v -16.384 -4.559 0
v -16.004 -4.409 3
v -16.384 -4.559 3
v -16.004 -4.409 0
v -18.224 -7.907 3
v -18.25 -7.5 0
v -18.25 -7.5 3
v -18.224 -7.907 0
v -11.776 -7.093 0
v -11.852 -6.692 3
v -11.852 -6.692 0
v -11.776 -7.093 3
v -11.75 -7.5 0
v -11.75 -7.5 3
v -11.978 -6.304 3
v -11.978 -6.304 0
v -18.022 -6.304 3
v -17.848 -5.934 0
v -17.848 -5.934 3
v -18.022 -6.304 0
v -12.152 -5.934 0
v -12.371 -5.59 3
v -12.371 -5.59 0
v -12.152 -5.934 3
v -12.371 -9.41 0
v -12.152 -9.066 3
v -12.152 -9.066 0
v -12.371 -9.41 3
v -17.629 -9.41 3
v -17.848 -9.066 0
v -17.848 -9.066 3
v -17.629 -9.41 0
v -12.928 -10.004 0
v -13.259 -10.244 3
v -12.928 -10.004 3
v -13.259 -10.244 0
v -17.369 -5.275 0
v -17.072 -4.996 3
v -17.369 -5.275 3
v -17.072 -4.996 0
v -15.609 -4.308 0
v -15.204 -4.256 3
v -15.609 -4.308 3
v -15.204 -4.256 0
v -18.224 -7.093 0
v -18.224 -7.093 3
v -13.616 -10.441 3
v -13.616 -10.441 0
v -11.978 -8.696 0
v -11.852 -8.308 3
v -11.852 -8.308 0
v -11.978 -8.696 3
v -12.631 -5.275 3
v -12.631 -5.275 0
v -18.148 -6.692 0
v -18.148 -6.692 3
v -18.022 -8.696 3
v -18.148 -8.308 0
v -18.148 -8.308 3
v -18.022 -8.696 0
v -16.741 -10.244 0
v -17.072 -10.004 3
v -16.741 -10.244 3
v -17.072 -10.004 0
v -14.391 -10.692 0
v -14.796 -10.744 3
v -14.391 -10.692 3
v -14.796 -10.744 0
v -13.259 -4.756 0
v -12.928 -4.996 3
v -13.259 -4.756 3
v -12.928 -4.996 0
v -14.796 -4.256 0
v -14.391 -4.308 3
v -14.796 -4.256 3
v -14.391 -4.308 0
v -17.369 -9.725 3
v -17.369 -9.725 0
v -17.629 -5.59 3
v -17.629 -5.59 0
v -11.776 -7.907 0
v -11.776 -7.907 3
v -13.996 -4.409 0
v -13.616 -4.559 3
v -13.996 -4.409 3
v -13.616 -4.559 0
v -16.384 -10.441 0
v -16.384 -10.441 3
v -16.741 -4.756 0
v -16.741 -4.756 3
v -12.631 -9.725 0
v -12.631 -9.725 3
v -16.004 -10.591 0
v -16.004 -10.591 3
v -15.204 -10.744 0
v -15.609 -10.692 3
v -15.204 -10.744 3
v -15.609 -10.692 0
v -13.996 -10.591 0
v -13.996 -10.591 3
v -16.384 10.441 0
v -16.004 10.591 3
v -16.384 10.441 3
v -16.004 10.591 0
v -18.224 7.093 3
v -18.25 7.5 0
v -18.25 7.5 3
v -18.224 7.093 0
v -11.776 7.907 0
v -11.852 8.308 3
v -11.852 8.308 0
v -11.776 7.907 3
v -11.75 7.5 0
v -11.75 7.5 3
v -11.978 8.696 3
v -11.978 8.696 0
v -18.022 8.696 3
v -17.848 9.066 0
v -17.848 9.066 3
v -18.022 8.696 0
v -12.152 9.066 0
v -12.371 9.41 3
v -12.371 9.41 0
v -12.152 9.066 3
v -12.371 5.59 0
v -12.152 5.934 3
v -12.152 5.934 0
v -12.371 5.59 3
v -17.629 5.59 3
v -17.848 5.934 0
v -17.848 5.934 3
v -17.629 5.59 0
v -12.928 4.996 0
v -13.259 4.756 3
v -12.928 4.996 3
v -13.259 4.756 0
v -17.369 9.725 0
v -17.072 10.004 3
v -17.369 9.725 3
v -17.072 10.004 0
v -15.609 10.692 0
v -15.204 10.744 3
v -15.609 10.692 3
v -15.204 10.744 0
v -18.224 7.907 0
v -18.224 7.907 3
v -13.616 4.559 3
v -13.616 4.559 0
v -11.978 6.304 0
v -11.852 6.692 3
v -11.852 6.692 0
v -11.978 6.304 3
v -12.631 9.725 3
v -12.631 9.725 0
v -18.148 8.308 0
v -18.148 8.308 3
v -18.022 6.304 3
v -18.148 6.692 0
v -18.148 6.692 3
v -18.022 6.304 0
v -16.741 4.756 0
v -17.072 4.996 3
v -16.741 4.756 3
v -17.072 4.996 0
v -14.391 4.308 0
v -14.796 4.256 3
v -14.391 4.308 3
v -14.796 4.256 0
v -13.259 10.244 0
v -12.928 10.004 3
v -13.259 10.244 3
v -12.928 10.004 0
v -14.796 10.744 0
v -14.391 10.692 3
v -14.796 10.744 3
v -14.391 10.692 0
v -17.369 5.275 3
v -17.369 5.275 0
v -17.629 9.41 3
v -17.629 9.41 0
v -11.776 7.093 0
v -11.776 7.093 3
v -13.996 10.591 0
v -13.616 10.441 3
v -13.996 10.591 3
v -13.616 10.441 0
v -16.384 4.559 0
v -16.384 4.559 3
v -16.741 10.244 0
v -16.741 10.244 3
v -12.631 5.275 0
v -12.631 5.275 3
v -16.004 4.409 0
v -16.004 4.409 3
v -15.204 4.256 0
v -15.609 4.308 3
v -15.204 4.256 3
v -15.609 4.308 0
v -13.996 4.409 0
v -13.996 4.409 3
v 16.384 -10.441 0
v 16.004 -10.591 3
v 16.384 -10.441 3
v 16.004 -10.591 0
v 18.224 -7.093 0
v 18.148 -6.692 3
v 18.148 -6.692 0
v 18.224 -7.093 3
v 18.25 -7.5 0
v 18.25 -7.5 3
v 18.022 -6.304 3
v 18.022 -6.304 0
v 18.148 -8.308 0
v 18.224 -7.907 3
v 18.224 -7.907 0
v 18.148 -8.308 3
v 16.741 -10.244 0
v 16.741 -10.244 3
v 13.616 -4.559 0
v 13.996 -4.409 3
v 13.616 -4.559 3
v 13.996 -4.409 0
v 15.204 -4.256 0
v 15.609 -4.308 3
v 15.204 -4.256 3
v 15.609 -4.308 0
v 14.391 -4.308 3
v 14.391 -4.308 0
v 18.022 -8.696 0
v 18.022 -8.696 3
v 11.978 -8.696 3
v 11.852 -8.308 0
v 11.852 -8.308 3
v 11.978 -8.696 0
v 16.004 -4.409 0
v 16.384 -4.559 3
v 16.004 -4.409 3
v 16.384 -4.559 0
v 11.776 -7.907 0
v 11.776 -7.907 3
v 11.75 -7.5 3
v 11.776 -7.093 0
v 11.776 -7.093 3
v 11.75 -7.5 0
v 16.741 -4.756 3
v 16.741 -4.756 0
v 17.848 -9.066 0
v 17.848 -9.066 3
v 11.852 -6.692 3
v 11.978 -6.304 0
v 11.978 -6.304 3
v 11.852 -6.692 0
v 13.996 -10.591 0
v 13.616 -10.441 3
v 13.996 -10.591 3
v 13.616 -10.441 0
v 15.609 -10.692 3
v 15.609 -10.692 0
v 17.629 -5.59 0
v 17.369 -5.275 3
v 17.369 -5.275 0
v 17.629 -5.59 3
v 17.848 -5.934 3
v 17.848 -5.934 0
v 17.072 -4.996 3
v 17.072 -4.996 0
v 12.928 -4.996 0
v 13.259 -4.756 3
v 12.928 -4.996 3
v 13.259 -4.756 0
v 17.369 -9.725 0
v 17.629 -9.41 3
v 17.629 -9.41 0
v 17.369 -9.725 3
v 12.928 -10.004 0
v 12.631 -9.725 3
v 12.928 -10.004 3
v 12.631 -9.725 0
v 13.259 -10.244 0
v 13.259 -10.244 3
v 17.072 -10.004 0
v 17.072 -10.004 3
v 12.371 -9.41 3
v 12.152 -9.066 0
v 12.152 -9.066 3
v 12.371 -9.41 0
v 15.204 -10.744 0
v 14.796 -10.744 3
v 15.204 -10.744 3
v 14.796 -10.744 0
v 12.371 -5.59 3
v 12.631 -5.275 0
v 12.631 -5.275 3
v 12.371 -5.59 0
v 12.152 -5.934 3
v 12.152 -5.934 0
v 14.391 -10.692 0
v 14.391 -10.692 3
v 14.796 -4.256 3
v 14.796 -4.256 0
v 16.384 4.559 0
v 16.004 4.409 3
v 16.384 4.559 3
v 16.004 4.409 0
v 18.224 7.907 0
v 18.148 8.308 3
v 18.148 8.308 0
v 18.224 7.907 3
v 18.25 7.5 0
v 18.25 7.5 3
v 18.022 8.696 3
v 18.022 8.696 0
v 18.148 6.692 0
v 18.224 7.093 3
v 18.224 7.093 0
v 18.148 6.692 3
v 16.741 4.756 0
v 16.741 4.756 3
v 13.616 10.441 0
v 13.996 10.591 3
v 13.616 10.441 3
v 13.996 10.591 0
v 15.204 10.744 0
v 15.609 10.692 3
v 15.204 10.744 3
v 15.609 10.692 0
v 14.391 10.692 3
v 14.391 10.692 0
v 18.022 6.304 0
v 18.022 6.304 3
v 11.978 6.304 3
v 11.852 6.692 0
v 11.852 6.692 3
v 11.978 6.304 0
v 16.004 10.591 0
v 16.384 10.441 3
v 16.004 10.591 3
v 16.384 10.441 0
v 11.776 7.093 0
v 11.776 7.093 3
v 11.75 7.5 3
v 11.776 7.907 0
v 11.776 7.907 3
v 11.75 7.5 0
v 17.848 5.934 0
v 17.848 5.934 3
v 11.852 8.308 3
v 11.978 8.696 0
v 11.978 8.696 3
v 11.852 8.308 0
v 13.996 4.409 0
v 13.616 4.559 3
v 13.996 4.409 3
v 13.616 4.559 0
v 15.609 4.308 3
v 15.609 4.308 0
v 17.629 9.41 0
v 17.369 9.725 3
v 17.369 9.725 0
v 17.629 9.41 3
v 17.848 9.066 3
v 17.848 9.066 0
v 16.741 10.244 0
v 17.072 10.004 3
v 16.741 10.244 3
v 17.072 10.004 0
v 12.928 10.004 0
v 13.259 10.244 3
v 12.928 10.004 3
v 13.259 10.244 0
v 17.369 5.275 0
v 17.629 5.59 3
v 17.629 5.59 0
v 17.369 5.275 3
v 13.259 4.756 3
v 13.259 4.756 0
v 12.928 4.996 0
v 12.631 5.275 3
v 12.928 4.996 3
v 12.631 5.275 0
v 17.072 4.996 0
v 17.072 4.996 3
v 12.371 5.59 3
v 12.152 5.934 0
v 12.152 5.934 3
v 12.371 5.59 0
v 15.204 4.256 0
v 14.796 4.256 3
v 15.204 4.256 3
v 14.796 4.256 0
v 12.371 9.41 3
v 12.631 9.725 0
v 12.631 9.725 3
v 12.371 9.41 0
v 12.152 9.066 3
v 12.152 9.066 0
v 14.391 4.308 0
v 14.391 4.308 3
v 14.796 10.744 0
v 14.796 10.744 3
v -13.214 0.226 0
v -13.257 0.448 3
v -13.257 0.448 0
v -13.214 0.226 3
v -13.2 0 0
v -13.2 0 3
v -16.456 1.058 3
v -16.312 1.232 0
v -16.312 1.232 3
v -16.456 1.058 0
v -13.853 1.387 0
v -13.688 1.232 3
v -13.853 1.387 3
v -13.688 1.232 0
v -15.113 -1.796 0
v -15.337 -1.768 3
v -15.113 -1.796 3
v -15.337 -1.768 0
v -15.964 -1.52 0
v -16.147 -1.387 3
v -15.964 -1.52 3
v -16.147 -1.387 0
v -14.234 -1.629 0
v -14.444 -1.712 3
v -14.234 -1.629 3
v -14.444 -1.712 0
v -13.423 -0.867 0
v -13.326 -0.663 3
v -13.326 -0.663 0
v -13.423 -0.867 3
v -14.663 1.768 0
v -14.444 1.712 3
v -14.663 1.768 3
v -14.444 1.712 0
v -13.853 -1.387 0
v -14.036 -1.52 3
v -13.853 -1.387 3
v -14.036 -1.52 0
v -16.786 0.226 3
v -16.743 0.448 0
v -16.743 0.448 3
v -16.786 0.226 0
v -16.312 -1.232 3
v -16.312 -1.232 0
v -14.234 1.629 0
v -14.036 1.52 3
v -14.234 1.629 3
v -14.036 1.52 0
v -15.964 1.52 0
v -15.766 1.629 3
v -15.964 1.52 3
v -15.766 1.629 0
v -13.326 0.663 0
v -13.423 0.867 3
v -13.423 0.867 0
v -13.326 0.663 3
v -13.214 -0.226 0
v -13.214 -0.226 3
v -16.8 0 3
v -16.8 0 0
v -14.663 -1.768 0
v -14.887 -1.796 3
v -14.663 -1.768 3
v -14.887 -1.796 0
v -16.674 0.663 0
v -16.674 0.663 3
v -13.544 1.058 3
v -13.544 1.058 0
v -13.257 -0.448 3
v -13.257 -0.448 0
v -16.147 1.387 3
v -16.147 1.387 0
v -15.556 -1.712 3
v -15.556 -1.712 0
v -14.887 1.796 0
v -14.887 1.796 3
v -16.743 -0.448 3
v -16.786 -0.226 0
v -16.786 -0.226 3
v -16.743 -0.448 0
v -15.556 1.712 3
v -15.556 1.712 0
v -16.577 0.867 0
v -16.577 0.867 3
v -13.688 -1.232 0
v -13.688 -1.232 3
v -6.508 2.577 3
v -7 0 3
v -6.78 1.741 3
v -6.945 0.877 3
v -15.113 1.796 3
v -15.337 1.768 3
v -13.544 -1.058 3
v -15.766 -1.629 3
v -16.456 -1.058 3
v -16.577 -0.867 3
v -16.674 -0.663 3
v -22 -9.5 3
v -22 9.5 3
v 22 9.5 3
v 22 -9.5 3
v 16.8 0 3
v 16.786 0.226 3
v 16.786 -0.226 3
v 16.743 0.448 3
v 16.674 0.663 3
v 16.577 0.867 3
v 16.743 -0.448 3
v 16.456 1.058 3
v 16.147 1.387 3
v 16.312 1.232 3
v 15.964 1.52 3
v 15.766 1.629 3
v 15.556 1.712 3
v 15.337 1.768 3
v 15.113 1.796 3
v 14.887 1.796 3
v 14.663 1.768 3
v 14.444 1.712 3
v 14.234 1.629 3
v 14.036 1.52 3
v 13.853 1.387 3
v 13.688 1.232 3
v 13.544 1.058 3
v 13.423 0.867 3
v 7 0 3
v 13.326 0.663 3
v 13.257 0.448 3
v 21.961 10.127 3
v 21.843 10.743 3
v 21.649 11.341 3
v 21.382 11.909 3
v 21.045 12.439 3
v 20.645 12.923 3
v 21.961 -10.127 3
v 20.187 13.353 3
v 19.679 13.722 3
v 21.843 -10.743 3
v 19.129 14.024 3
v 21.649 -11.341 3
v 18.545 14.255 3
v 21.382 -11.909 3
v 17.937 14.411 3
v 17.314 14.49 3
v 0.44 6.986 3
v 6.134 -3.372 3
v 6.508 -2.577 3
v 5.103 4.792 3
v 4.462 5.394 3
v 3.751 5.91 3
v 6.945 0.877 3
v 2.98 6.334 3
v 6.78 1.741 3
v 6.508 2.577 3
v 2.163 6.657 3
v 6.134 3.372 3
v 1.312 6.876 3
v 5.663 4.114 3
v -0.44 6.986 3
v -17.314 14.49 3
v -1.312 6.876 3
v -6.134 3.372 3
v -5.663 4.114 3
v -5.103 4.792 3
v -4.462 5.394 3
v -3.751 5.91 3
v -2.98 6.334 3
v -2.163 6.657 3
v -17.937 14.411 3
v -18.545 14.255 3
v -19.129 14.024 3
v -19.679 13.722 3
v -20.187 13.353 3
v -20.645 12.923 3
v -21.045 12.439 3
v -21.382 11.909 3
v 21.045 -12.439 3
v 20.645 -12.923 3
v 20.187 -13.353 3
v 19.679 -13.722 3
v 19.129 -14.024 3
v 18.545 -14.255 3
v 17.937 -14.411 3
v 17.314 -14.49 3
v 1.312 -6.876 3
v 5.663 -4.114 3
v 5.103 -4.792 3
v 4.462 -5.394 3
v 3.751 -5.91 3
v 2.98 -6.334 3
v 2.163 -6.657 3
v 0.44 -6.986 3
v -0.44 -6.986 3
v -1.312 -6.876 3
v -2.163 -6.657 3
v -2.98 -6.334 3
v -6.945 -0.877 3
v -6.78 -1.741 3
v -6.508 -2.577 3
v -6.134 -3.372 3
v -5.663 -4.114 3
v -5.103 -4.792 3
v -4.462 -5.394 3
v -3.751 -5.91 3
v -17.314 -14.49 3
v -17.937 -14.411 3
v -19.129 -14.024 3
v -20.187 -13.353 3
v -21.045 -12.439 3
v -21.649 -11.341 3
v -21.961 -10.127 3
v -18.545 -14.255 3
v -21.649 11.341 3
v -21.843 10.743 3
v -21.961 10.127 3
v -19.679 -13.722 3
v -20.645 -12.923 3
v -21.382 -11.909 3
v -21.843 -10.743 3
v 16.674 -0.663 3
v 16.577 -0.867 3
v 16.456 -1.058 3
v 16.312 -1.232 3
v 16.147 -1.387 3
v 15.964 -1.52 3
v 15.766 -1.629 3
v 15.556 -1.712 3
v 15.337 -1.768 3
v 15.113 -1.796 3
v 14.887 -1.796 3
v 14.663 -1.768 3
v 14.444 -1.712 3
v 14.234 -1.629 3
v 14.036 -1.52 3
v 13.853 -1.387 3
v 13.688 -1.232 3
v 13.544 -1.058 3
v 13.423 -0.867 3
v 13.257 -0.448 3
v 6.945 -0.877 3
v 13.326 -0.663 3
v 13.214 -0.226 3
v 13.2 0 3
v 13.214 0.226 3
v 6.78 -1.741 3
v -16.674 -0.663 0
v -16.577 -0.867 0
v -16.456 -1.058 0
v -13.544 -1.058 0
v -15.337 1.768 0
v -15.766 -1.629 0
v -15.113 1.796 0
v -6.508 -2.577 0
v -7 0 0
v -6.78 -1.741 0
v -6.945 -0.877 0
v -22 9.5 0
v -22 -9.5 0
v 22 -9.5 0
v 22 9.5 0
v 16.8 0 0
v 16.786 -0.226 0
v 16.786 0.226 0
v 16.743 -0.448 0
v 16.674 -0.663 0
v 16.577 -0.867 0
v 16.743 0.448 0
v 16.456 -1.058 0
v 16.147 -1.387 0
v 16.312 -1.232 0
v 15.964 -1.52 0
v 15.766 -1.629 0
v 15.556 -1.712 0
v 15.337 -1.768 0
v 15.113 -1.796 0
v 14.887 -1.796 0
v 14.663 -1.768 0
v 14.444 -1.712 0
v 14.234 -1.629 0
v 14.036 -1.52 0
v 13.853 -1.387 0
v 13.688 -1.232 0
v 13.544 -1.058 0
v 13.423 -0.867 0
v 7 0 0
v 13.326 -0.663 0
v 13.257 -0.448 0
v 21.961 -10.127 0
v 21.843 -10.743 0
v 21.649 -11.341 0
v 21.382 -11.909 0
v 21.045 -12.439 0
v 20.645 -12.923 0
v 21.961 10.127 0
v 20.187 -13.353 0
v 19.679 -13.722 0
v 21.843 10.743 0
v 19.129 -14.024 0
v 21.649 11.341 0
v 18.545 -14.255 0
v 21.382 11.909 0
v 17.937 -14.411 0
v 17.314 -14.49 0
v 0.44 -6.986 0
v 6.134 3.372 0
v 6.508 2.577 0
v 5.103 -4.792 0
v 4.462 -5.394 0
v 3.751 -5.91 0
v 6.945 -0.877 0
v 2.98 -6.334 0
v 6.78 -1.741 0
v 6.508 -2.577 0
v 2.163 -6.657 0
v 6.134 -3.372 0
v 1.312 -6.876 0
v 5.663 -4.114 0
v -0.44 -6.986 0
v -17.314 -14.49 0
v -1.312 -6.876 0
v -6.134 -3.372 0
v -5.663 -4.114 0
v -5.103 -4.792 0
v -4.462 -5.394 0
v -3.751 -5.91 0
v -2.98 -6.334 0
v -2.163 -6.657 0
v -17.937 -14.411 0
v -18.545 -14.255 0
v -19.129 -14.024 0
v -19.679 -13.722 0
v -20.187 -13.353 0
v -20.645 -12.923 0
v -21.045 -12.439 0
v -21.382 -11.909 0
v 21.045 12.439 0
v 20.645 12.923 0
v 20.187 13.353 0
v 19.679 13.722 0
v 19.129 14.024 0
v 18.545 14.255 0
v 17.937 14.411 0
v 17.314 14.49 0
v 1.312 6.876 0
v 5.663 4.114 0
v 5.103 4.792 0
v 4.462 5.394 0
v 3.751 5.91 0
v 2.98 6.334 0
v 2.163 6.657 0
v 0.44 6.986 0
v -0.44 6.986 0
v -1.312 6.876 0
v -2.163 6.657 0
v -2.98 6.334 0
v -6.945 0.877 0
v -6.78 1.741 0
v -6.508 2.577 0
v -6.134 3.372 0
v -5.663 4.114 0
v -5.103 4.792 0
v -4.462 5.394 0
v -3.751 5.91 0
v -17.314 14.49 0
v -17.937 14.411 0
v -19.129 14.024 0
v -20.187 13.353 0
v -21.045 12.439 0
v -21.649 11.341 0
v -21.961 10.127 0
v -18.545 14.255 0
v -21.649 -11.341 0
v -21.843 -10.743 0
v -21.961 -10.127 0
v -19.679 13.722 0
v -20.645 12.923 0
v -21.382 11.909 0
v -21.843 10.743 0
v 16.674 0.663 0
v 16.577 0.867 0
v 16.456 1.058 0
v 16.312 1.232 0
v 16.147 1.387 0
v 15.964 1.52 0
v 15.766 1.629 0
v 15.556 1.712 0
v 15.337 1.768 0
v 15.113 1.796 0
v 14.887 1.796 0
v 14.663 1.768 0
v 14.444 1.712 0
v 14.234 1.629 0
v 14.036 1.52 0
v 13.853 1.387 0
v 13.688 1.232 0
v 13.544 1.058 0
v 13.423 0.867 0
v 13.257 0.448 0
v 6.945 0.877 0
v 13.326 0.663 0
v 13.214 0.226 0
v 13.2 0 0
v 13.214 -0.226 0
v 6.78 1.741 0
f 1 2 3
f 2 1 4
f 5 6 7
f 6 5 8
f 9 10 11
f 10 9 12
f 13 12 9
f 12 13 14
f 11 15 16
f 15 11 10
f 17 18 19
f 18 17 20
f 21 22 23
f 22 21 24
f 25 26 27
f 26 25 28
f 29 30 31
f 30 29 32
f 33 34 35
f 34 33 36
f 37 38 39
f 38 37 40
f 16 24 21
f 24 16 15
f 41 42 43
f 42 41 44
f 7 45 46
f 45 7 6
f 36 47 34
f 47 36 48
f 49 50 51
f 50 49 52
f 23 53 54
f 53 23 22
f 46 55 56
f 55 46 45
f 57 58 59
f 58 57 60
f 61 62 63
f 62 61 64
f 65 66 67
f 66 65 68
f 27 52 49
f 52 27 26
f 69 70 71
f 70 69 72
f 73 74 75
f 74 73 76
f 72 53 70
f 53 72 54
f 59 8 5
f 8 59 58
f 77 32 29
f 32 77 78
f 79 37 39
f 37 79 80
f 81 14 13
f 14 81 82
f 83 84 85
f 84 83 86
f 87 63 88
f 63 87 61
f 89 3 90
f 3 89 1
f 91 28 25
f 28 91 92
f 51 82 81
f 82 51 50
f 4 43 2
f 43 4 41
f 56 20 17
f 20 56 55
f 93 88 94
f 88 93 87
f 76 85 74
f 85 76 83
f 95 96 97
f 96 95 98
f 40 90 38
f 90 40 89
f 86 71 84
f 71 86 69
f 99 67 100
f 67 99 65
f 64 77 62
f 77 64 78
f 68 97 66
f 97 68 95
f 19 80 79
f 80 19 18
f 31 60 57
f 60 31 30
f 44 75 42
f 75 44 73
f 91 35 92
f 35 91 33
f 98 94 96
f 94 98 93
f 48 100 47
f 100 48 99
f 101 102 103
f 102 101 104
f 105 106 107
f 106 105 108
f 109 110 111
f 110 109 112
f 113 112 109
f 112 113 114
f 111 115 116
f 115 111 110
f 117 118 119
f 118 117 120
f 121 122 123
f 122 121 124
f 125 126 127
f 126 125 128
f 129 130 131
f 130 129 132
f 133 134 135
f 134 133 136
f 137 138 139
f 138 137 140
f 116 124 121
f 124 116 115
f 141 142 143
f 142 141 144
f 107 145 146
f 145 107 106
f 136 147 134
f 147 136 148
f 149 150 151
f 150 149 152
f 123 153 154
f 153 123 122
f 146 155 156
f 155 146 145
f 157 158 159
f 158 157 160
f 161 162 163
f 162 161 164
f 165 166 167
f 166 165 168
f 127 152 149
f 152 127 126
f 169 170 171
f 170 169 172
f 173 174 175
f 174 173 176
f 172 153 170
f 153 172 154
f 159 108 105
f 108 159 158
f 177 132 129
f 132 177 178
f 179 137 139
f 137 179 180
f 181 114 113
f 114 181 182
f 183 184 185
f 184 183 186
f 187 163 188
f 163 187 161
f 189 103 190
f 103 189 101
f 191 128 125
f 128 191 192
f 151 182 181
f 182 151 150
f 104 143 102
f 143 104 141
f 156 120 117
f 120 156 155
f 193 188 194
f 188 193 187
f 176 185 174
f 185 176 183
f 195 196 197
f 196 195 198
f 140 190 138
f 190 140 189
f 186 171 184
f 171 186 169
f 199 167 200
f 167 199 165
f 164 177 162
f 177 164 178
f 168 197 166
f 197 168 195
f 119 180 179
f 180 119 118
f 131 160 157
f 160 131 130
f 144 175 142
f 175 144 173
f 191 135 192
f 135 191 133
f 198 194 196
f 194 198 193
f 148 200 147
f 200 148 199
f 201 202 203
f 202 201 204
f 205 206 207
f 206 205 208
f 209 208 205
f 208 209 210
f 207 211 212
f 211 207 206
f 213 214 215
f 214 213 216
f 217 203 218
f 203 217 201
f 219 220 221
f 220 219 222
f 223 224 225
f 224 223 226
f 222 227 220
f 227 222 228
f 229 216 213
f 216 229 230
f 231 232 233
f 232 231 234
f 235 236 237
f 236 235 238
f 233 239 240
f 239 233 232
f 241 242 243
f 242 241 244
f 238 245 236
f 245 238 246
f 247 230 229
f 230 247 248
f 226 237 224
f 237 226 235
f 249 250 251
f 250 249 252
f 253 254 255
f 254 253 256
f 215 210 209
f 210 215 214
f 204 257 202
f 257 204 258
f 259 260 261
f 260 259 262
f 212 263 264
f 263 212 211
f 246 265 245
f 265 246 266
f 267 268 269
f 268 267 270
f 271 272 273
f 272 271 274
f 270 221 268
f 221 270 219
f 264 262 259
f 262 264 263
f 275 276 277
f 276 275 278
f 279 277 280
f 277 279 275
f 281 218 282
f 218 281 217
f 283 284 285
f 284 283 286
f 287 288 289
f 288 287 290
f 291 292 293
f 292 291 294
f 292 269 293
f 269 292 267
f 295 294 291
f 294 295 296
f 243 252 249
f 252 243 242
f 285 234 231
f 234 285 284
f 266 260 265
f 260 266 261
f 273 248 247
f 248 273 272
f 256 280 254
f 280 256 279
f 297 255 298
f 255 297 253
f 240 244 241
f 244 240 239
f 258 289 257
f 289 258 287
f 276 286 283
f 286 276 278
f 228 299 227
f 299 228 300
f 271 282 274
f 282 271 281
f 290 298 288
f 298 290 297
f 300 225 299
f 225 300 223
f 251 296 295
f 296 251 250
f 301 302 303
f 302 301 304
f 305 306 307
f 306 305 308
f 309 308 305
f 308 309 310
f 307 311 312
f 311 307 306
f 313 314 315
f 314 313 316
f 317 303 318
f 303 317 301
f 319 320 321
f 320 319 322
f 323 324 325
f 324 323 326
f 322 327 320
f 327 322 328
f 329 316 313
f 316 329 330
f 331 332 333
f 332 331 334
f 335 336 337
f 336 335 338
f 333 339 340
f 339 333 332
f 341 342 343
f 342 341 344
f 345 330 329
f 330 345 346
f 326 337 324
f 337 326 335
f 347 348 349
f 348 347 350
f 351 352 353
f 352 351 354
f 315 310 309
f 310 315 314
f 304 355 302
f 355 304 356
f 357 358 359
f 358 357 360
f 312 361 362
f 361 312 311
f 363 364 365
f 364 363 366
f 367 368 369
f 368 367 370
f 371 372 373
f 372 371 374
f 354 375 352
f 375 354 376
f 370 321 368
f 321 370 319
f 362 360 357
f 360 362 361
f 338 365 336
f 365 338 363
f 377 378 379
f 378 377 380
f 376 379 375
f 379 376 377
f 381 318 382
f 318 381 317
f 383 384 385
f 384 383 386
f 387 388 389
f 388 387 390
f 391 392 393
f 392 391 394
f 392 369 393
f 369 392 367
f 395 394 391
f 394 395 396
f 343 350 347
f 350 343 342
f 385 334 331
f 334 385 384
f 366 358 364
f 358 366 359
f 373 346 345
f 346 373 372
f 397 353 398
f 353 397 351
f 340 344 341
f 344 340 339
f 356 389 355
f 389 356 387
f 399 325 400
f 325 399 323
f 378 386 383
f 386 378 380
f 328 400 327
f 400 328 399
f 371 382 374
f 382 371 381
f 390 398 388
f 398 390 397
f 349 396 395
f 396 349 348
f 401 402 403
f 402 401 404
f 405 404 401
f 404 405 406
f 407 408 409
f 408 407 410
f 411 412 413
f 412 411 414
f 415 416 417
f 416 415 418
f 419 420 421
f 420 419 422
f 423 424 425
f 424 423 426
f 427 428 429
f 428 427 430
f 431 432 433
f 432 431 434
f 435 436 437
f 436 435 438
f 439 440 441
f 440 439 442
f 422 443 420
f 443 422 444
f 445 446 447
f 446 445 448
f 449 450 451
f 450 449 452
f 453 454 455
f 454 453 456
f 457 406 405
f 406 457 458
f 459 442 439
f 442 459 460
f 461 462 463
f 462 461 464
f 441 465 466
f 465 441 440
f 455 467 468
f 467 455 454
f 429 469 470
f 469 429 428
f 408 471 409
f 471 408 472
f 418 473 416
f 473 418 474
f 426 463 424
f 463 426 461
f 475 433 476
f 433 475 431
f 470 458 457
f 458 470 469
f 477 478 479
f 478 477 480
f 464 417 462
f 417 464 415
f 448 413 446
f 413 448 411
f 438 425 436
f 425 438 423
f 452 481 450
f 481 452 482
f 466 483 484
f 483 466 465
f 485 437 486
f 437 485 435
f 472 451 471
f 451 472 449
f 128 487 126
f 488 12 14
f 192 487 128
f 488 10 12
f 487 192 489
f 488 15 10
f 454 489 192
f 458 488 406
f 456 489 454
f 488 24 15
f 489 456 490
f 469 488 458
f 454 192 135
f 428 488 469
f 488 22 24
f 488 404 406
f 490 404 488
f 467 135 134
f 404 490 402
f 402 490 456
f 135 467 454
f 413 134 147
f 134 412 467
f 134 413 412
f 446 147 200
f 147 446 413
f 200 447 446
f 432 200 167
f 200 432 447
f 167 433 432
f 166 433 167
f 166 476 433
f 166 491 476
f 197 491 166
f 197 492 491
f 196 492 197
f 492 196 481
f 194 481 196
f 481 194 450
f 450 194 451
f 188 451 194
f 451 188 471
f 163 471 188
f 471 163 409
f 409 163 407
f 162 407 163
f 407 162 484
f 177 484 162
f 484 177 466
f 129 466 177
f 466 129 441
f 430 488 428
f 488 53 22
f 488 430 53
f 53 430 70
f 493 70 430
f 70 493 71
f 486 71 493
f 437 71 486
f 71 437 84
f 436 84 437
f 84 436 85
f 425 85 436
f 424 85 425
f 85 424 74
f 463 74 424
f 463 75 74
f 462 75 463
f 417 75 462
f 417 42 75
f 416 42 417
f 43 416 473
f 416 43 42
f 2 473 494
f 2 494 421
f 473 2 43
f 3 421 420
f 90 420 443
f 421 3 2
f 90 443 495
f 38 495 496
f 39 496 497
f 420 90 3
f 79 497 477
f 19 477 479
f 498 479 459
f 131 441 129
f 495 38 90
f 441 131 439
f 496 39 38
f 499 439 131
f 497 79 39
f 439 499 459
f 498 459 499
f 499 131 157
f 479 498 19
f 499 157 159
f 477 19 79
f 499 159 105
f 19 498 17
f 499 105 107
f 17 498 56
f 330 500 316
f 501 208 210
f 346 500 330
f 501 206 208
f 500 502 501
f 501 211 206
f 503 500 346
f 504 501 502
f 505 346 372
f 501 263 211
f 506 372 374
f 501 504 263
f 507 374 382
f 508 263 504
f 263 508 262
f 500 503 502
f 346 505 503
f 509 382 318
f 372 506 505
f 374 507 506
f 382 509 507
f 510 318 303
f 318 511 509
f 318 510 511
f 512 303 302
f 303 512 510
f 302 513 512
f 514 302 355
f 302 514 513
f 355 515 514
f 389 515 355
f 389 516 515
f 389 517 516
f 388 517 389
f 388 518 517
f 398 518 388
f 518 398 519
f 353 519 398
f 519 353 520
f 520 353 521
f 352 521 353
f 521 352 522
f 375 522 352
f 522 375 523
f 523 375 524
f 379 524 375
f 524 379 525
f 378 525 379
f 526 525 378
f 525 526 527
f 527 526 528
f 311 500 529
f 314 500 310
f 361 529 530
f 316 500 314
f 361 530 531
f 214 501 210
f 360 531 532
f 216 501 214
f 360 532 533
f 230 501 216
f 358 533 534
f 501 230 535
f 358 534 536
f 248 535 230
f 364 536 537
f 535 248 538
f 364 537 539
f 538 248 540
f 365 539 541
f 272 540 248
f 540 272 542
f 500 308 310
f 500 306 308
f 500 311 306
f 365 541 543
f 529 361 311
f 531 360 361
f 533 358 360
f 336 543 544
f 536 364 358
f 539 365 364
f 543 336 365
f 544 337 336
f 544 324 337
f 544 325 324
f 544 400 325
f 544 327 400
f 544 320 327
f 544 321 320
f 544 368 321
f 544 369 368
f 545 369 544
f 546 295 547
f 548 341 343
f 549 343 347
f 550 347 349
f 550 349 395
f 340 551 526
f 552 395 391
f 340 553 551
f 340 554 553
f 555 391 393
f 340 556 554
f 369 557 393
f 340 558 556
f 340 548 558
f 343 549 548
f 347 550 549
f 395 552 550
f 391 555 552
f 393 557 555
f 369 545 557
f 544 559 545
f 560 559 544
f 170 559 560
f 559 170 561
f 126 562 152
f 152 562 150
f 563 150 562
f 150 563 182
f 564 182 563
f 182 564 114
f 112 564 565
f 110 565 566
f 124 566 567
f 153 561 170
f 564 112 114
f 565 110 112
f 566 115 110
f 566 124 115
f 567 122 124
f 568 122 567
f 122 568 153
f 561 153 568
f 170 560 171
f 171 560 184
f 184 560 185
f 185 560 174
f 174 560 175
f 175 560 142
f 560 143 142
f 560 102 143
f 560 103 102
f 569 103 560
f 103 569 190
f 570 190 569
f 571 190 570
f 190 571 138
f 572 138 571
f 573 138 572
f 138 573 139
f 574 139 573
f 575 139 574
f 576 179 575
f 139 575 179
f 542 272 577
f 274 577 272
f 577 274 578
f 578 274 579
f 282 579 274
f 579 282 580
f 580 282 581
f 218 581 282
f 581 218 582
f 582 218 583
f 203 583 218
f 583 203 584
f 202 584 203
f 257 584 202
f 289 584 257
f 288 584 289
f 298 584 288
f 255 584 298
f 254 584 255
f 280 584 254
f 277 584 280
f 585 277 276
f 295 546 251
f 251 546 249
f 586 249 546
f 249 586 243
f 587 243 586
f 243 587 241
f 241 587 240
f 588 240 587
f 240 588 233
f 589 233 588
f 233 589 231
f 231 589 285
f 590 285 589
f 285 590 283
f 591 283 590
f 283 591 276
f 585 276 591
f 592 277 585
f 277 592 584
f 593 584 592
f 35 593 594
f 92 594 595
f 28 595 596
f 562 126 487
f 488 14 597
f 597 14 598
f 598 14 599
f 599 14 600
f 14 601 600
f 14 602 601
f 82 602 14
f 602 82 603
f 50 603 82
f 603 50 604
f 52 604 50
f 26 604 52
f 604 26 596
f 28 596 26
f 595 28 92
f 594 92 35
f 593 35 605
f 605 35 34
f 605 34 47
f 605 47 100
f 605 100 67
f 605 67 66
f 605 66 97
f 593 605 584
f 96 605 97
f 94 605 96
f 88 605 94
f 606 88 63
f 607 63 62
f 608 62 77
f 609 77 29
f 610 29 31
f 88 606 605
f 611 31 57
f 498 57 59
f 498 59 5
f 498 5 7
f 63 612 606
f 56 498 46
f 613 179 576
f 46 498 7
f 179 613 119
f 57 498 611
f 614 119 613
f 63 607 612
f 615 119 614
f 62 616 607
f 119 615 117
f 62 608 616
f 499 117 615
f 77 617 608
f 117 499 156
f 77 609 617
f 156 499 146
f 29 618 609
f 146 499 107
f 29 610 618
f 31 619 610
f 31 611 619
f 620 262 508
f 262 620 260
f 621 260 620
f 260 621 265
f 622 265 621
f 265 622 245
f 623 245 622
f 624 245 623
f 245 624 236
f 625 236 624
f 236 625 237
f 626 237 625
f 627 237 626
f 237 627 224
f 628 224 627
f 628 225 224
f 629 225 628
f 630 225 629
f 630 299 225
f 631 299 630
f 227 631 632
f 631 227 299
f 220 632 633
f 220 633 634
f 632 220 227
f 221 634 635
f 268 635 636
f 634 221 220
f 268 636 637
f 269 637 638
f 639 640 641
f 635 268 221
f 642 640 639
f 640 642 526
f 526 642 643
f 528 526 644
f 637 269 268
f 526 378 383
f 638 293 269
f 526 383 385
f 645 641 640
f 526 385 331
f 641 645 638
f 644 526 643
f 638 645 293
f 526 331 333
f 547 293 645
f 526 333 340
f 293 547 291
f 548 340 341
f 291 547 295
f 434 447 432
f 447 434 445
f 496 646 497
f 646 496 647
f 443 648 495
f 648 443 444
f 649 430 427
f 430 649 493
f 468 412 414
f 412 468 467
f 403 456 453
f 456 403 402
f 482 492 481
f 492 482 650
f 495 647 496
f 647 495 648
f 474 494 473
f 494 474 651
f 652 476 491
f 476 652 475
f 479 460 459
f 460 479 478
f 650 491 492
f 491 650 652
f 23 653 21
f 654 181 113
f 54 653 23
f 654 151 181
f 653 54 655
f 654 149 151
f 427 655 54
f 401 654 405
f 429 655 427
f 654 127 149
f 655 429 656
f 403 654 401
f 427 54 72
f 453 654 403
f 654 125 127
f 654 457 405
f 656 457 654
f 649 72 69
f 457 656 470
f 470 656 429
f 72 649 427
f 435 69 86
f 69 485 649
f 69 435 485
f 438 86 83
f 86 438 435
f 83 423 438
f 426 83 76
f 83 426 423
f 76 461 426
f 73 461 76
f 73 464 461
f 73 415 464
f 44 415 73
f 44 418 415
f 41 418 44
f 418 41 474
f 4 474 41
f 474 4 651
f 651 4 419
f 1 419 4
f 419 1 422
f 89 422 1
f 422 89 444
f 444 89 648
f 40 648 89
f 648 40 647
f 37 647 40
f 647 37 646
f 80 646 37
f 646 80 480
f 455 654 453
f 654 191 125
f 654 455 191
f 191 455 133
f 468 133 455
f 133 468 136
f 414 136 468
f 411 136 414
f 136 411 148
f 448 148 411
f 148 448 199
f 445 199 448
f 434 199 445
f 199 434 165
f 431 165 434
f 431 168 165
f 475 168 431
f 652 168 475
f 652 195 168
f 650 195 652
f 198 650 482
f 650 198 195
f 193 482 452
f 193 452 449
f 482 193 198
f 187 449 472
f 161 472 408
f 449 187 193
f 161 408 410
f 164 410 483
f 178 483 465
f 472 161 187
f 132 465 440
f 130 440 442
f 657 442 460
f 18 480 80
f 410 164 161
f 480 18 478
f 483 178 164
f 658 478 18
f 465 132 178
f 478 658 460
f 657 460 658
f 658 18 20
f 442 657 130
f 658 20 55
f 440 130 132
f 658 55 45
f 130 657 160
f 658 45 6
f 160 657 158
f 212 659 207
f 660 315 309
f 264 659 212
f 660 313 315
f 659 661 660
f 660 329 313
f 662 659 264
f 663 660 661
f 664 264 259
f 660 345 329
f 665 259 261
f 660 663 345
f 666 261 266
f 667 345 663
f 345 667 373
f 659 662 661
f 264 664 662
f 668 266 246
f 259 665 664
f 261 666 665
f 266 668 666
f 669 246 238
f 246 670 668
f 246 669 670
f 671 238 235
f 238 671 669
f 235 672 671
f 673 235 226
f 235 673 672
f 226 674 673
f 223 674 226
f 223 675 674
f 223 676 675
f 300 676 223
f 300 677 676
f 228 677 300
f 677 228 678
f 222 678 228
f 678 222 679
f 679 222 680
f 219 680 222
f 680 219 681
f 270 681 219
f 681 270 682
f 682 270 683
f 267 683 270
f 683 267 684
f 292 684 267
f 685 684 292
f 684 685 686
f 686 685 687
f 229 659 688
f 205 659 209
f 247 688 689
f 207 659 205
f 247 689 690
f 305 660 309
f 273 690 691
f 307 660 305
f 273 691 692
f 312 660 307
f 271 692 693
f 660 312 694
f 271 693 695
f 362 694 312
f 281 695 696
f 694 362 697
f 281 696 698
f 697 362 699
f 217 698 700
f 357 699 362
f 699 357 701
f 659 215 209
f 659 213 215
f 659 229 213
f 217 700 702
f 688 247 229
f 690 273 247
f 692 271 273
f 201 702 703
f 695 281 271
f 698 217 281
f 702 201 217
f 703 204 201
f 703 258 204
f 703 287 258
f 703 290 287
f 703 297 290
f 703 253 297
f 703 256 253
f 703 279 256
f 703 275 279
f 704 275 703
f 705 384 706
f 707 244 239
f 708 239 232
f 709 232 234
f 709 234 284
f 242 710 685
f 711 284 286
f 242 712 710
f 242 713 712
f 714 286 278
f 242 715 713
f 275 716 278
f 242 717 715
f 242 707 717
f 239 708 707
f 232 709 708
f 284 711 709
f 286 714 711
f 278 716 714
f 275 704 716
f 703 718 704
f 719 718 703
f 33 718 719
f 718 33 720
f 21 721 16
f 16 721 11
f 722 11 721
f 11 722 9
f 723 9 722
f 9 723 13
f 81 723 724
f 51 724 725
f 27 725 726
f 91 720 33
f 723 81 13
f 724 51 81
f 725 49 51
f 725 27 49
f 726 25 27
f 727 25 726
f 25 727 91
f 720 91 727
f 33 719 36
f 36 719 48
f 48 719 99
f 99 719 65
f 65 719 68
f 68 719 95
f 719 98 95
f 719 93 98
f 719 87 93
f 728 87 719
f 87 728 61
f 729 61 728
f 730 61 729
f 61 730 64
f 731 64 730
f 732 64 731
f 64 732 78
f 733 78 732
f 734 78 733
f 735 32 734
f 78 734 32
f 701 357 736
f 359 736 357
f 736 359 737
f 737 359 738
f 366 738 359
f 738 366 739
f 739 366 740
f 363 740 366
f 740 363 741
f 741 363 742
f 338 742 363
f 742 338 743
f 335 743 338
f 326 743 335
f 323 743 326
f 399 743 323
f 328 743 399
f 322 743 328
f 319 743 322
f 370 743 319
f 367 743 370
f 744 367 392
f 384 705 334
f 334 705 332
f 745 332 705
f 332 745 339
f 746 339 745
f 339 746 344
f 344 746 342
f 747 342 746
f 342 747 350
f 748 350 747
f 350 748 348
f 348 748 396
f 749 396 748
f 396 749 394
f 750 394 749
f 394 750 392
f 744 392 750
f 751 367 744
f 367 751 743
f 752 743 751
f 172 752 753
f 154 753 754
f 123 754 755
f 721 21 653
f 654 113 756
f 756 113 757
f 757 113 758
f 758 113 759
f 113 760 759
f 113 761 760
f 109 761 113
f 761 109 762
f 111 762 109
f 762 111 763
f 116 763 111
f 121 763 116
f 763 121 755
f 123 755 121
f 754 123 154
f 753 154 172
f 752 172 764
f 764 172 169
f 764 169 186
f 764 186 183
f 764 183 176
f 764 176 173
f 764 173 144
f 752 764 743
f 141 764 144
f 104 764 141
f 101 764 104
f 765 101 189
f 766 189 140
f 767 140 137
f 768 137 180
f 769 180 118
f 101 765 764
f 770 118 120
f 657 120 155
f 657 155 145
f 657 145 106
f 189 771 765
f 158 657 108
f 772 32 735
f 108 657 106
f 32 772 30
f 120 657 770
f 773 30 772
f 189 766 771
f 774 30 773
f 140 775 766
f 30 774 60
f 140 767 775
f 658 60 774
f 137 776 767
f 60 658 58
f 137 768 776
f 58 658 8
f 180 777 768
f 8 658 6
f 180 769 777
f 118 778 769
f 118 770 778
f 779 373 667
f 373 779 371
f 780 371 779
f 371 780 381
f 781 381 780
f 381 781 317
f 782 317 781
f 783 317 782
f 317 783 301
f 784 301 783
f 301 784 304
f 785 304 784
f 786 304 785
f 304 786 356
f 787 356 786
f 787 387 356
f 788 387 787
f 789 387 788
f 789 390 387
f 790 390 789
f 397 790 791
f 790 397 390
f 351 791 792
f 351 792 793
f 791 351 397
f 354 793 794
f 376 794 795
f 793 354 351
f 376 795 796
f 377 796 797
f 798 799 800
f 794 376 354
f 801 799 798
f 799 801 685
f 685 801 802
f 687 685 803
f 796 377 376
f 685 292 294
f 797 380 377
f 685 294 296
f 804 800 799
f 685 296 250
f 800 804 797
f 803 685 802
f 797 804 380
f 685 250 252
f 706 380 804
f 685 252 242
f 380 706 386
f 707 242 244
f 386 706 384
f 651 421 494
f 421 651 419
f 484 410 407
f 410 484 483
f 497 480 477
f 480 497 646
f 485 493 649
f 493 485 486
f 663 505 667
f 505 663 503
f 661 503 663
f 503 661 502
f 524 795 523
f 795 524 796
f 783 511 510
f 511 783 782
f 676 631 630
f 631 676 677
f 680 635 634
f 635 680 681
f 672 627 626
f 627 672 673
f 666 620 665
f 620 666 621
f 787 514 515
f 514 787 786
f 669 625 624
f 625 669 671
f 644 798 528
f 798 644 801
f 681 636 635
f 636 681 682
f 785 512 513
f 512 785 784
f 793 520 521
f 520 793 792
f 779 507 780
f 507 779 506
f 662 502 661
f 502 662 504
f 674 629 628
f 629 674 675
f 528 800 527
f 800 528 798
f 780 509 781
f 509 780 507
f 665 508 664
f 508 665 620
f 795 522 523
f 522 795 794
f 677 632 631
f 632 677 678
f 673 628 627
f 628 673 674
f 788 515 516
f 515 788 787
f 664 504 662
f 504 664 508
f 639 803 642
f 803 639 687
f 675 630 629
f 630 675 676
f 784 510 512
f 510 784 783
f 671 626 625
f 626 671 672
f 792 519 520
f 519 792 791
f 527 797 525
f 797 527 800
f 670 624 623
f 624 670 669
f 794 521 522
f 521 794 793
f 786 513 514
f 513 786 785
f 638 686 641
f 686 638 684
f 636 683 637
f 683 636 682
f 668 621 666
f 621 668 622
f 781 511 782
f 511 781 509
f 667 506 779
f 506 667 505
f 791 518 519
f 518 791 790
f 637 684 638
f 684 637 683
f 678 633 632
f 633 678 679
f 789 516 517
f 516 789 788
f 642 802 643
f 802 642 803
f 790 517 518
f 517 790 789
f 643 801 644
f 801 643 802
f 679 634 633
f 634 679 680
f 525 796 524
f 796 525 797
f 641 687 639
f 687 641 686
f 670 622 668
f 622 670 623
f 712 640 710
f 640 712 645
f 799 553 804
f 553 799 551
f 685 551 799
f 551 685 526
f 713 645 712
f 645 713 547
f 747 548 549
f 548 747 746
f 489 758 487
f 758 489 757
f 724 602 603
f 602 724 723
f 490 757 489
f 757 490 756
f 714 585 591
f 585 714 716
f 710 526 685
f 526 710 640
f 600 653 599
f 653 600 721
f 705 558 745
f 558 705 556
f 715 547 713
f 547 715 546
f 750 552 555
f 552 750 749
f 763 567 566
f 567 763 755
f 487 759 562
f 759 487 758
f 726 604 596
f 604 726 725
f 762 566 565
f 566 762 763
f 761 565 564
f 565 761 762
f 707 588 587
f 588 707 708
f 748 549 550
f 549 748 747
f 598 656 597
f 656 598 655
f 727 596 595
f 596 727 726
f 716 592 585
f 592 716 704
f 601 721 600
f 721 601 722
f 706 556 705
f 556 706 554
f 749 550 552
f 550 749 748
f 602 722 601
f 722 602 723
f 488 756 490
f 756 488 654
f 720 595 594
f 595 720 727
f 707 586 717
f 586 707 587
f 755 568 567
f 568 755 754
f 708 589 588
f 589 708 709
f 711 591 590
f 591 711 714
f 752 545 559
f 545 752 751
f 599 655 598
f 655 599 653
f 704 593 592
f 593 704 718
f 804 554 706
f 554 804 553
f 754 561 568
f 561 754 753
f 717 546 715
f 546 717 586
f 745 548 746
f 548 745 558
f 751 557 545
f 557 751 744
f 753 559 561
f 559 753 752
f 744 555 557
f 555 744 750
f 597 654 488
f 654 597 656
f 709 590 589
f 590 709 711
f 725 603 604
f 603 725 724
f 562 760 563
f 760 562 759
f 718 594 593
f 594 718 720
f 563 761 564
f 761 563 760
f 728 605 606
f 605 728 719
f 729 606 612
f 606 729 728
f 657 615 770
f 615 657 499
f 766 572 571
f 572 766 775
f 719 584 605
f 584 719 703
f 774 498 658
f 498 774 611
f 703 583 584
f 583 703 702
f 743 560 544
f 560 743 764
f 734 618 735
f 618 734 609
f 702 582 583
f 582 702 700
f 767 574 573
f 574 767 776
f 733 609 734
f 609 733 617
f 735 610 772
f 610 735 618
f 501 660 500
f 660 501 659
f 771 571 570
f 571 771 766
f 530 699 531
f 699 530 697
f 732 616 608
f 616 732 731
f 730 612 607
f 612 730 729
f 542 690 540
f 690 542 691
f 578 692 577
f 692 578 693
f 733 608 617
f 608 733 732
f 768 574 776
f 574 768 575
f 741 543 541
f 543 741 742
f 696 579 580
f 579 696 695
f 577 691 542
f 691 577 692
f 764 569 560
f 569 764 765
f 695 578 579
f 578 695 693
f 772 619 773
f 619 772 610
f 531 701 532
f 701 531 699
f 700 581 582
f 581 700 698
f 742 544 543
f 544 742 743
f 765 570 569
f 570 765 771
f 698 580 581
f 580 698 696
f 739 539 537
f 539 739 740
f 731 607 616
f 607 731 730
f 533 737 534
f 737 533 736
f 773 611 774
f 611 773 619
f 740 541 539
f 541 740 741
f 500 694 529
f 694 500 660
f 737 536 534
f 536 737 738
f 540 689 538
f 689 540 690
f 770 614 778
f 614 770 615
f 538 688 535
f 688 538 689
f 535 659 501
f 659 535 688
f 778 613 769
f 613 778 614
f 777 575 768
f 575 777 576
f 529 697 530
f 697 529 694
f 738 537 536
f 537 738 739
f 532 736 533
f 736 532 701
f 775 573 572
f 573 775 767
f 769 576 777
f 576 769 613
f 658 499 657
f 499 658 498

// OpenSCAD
$fn = 50;


difference() {
	union() {
		hull() {
			translate(v = [-17.0000000000, 9.5000000000, 0]) {
				cylinder(h = 3, r = 5);
			}
			translate(v = [17.0000000000, 9.5000000000, 0]) {
				cylinder(h = 3, r = 5);
			}
			translate(v = [-17.0000000000, -9.5000000000, 0]) {
				cylinder(h = 3, r = 5);
			}
			translate(v = [17.0000000000, -9.5000000000, 0]) {
				cylinder(h = 3, r = 5);
			}
		}
	}
	union() {
		#translate(v = [-15.0000000000, -7.5000000000, 0]) {
			cylinder(h = 3, r = 3.2500000000);
		}
		#translate(v = [-15.0000000000, 7.5000000000, 0]) {
			cylinder(h = 3, r = 3.2500000000);
		}
		#translate(v = [15.0000000000, -7.5000000000, 0]) {
			cylinder(h = 3, r = 3.2500000000);
		}
		#translate(v = [15.0000000000, 7.5000000000, 0]) {
			cylinder(h = 3, r = 3.2500000000);
		}
		#translate(v = [-15.0000000000, -7.5000000000, -100.0000000000]) {
			cylinder(h = 200, r = 3.2500000000);
		}
		#translate(v = [-15.0000000000, 7.5000000000, -100.0000000000]) {
			cylinder(h = 200, r = 3.2500000000);
		}
		#translate(v = [15.0000000000, -7.5000000000, -100.0000000000]) {
			cylinder(h = 200, r = 3.2500000000);
		}
		#translate(v = [15.0000000000, 7.5000000000, -100.0000000000]) {
			cylinder(h = 200, r = 3.2500000000);
		}
		#translate(v = [-15.0000000000, -7.5000000000, 0]) {
			cylinder(h = 3, r = 1.8000000000);
		}
		#translate(v = [-15.0000000000, 0.0000000000, 0]) {
			cylinder(h = 3, r = 1.8000000000);
		}
		#translate(v = [-15.0000000000, 7.5000000000, 0]) {
			cylinder(h = 3, r = 1.8000000000);
		}
		#translate(v = [15.0000000000, -7.5000000000, 0]) {
			cylinder(h = 3, r = 1.8000000000);
		}
		#translate(v = [15.0000000000, 0.0000000000, 0]) {
			cylinder(h = 3, r = 1.8000000000);
		}
		#translate(v = [15.0000000000, 7.5000000000, 0]) {
			cylinder(h = 3, r = 1.8000000000);
		}
		#translate(v = [-15.0000000000, -7.5000000000, 0]) {
			cylinder(h = 3, r = 1.8000000000);
		}
		#translate(v = [-15.0000000000, 0.0000000000, 0]) {
			cylinder(h = 3, r = 1.8000000000);
		}
		#translate(v = [-15.0000000000, 7.5000000000, 0]) {
			cylinder(h = 3, r = 1.8000000000);
		}
		#translate(v = [15.0000000000, -7.5000000000, 0]) {
			cylinder(h = 3, r = 1.8000000000);
		}
		#translate(v = [15.0000000000, 0.0000000000, 0]) {
			cylinder(h = 3, r = 1.8000000000);
		}
		#translate(v = [15.0000000000, 7.5000000000, 0]) {
			cylinder(h = 3, r = 1.8000000000);
		}
		#translate(v = [-15.0000000000, -7.5000000000, 0]) {
			cylinder(h = 3, r = 1.8000000000);
		}
		#translate(v = [-15.0000000000, 0.0000000000, 0]) {
			cylinder(h = 3, r = 1.8000000000);
		}
		#translate(v = [-15.0000000000, 7.5000000000, 0]) {
			cylinder(h = 3, r = 1.8000000000);
		}
		#translate(v = [15.0000000000, -7.5000000000, 0]) {
			cylinder(h = 3, r = 1.8000000000);
		}
		#translate(v = [15.0000000000, 0.0000000000, 0]) {
			cylinder(h = 3, r = 1.8000000000);
		}
		#translate(v = [15.0000000000, 7.5000000000, 0]) {
			cylinder(h = 3, r = 1.8000000000);
		}
		#cylinder(h = 3, r = 7.0000000000);
	}
}
